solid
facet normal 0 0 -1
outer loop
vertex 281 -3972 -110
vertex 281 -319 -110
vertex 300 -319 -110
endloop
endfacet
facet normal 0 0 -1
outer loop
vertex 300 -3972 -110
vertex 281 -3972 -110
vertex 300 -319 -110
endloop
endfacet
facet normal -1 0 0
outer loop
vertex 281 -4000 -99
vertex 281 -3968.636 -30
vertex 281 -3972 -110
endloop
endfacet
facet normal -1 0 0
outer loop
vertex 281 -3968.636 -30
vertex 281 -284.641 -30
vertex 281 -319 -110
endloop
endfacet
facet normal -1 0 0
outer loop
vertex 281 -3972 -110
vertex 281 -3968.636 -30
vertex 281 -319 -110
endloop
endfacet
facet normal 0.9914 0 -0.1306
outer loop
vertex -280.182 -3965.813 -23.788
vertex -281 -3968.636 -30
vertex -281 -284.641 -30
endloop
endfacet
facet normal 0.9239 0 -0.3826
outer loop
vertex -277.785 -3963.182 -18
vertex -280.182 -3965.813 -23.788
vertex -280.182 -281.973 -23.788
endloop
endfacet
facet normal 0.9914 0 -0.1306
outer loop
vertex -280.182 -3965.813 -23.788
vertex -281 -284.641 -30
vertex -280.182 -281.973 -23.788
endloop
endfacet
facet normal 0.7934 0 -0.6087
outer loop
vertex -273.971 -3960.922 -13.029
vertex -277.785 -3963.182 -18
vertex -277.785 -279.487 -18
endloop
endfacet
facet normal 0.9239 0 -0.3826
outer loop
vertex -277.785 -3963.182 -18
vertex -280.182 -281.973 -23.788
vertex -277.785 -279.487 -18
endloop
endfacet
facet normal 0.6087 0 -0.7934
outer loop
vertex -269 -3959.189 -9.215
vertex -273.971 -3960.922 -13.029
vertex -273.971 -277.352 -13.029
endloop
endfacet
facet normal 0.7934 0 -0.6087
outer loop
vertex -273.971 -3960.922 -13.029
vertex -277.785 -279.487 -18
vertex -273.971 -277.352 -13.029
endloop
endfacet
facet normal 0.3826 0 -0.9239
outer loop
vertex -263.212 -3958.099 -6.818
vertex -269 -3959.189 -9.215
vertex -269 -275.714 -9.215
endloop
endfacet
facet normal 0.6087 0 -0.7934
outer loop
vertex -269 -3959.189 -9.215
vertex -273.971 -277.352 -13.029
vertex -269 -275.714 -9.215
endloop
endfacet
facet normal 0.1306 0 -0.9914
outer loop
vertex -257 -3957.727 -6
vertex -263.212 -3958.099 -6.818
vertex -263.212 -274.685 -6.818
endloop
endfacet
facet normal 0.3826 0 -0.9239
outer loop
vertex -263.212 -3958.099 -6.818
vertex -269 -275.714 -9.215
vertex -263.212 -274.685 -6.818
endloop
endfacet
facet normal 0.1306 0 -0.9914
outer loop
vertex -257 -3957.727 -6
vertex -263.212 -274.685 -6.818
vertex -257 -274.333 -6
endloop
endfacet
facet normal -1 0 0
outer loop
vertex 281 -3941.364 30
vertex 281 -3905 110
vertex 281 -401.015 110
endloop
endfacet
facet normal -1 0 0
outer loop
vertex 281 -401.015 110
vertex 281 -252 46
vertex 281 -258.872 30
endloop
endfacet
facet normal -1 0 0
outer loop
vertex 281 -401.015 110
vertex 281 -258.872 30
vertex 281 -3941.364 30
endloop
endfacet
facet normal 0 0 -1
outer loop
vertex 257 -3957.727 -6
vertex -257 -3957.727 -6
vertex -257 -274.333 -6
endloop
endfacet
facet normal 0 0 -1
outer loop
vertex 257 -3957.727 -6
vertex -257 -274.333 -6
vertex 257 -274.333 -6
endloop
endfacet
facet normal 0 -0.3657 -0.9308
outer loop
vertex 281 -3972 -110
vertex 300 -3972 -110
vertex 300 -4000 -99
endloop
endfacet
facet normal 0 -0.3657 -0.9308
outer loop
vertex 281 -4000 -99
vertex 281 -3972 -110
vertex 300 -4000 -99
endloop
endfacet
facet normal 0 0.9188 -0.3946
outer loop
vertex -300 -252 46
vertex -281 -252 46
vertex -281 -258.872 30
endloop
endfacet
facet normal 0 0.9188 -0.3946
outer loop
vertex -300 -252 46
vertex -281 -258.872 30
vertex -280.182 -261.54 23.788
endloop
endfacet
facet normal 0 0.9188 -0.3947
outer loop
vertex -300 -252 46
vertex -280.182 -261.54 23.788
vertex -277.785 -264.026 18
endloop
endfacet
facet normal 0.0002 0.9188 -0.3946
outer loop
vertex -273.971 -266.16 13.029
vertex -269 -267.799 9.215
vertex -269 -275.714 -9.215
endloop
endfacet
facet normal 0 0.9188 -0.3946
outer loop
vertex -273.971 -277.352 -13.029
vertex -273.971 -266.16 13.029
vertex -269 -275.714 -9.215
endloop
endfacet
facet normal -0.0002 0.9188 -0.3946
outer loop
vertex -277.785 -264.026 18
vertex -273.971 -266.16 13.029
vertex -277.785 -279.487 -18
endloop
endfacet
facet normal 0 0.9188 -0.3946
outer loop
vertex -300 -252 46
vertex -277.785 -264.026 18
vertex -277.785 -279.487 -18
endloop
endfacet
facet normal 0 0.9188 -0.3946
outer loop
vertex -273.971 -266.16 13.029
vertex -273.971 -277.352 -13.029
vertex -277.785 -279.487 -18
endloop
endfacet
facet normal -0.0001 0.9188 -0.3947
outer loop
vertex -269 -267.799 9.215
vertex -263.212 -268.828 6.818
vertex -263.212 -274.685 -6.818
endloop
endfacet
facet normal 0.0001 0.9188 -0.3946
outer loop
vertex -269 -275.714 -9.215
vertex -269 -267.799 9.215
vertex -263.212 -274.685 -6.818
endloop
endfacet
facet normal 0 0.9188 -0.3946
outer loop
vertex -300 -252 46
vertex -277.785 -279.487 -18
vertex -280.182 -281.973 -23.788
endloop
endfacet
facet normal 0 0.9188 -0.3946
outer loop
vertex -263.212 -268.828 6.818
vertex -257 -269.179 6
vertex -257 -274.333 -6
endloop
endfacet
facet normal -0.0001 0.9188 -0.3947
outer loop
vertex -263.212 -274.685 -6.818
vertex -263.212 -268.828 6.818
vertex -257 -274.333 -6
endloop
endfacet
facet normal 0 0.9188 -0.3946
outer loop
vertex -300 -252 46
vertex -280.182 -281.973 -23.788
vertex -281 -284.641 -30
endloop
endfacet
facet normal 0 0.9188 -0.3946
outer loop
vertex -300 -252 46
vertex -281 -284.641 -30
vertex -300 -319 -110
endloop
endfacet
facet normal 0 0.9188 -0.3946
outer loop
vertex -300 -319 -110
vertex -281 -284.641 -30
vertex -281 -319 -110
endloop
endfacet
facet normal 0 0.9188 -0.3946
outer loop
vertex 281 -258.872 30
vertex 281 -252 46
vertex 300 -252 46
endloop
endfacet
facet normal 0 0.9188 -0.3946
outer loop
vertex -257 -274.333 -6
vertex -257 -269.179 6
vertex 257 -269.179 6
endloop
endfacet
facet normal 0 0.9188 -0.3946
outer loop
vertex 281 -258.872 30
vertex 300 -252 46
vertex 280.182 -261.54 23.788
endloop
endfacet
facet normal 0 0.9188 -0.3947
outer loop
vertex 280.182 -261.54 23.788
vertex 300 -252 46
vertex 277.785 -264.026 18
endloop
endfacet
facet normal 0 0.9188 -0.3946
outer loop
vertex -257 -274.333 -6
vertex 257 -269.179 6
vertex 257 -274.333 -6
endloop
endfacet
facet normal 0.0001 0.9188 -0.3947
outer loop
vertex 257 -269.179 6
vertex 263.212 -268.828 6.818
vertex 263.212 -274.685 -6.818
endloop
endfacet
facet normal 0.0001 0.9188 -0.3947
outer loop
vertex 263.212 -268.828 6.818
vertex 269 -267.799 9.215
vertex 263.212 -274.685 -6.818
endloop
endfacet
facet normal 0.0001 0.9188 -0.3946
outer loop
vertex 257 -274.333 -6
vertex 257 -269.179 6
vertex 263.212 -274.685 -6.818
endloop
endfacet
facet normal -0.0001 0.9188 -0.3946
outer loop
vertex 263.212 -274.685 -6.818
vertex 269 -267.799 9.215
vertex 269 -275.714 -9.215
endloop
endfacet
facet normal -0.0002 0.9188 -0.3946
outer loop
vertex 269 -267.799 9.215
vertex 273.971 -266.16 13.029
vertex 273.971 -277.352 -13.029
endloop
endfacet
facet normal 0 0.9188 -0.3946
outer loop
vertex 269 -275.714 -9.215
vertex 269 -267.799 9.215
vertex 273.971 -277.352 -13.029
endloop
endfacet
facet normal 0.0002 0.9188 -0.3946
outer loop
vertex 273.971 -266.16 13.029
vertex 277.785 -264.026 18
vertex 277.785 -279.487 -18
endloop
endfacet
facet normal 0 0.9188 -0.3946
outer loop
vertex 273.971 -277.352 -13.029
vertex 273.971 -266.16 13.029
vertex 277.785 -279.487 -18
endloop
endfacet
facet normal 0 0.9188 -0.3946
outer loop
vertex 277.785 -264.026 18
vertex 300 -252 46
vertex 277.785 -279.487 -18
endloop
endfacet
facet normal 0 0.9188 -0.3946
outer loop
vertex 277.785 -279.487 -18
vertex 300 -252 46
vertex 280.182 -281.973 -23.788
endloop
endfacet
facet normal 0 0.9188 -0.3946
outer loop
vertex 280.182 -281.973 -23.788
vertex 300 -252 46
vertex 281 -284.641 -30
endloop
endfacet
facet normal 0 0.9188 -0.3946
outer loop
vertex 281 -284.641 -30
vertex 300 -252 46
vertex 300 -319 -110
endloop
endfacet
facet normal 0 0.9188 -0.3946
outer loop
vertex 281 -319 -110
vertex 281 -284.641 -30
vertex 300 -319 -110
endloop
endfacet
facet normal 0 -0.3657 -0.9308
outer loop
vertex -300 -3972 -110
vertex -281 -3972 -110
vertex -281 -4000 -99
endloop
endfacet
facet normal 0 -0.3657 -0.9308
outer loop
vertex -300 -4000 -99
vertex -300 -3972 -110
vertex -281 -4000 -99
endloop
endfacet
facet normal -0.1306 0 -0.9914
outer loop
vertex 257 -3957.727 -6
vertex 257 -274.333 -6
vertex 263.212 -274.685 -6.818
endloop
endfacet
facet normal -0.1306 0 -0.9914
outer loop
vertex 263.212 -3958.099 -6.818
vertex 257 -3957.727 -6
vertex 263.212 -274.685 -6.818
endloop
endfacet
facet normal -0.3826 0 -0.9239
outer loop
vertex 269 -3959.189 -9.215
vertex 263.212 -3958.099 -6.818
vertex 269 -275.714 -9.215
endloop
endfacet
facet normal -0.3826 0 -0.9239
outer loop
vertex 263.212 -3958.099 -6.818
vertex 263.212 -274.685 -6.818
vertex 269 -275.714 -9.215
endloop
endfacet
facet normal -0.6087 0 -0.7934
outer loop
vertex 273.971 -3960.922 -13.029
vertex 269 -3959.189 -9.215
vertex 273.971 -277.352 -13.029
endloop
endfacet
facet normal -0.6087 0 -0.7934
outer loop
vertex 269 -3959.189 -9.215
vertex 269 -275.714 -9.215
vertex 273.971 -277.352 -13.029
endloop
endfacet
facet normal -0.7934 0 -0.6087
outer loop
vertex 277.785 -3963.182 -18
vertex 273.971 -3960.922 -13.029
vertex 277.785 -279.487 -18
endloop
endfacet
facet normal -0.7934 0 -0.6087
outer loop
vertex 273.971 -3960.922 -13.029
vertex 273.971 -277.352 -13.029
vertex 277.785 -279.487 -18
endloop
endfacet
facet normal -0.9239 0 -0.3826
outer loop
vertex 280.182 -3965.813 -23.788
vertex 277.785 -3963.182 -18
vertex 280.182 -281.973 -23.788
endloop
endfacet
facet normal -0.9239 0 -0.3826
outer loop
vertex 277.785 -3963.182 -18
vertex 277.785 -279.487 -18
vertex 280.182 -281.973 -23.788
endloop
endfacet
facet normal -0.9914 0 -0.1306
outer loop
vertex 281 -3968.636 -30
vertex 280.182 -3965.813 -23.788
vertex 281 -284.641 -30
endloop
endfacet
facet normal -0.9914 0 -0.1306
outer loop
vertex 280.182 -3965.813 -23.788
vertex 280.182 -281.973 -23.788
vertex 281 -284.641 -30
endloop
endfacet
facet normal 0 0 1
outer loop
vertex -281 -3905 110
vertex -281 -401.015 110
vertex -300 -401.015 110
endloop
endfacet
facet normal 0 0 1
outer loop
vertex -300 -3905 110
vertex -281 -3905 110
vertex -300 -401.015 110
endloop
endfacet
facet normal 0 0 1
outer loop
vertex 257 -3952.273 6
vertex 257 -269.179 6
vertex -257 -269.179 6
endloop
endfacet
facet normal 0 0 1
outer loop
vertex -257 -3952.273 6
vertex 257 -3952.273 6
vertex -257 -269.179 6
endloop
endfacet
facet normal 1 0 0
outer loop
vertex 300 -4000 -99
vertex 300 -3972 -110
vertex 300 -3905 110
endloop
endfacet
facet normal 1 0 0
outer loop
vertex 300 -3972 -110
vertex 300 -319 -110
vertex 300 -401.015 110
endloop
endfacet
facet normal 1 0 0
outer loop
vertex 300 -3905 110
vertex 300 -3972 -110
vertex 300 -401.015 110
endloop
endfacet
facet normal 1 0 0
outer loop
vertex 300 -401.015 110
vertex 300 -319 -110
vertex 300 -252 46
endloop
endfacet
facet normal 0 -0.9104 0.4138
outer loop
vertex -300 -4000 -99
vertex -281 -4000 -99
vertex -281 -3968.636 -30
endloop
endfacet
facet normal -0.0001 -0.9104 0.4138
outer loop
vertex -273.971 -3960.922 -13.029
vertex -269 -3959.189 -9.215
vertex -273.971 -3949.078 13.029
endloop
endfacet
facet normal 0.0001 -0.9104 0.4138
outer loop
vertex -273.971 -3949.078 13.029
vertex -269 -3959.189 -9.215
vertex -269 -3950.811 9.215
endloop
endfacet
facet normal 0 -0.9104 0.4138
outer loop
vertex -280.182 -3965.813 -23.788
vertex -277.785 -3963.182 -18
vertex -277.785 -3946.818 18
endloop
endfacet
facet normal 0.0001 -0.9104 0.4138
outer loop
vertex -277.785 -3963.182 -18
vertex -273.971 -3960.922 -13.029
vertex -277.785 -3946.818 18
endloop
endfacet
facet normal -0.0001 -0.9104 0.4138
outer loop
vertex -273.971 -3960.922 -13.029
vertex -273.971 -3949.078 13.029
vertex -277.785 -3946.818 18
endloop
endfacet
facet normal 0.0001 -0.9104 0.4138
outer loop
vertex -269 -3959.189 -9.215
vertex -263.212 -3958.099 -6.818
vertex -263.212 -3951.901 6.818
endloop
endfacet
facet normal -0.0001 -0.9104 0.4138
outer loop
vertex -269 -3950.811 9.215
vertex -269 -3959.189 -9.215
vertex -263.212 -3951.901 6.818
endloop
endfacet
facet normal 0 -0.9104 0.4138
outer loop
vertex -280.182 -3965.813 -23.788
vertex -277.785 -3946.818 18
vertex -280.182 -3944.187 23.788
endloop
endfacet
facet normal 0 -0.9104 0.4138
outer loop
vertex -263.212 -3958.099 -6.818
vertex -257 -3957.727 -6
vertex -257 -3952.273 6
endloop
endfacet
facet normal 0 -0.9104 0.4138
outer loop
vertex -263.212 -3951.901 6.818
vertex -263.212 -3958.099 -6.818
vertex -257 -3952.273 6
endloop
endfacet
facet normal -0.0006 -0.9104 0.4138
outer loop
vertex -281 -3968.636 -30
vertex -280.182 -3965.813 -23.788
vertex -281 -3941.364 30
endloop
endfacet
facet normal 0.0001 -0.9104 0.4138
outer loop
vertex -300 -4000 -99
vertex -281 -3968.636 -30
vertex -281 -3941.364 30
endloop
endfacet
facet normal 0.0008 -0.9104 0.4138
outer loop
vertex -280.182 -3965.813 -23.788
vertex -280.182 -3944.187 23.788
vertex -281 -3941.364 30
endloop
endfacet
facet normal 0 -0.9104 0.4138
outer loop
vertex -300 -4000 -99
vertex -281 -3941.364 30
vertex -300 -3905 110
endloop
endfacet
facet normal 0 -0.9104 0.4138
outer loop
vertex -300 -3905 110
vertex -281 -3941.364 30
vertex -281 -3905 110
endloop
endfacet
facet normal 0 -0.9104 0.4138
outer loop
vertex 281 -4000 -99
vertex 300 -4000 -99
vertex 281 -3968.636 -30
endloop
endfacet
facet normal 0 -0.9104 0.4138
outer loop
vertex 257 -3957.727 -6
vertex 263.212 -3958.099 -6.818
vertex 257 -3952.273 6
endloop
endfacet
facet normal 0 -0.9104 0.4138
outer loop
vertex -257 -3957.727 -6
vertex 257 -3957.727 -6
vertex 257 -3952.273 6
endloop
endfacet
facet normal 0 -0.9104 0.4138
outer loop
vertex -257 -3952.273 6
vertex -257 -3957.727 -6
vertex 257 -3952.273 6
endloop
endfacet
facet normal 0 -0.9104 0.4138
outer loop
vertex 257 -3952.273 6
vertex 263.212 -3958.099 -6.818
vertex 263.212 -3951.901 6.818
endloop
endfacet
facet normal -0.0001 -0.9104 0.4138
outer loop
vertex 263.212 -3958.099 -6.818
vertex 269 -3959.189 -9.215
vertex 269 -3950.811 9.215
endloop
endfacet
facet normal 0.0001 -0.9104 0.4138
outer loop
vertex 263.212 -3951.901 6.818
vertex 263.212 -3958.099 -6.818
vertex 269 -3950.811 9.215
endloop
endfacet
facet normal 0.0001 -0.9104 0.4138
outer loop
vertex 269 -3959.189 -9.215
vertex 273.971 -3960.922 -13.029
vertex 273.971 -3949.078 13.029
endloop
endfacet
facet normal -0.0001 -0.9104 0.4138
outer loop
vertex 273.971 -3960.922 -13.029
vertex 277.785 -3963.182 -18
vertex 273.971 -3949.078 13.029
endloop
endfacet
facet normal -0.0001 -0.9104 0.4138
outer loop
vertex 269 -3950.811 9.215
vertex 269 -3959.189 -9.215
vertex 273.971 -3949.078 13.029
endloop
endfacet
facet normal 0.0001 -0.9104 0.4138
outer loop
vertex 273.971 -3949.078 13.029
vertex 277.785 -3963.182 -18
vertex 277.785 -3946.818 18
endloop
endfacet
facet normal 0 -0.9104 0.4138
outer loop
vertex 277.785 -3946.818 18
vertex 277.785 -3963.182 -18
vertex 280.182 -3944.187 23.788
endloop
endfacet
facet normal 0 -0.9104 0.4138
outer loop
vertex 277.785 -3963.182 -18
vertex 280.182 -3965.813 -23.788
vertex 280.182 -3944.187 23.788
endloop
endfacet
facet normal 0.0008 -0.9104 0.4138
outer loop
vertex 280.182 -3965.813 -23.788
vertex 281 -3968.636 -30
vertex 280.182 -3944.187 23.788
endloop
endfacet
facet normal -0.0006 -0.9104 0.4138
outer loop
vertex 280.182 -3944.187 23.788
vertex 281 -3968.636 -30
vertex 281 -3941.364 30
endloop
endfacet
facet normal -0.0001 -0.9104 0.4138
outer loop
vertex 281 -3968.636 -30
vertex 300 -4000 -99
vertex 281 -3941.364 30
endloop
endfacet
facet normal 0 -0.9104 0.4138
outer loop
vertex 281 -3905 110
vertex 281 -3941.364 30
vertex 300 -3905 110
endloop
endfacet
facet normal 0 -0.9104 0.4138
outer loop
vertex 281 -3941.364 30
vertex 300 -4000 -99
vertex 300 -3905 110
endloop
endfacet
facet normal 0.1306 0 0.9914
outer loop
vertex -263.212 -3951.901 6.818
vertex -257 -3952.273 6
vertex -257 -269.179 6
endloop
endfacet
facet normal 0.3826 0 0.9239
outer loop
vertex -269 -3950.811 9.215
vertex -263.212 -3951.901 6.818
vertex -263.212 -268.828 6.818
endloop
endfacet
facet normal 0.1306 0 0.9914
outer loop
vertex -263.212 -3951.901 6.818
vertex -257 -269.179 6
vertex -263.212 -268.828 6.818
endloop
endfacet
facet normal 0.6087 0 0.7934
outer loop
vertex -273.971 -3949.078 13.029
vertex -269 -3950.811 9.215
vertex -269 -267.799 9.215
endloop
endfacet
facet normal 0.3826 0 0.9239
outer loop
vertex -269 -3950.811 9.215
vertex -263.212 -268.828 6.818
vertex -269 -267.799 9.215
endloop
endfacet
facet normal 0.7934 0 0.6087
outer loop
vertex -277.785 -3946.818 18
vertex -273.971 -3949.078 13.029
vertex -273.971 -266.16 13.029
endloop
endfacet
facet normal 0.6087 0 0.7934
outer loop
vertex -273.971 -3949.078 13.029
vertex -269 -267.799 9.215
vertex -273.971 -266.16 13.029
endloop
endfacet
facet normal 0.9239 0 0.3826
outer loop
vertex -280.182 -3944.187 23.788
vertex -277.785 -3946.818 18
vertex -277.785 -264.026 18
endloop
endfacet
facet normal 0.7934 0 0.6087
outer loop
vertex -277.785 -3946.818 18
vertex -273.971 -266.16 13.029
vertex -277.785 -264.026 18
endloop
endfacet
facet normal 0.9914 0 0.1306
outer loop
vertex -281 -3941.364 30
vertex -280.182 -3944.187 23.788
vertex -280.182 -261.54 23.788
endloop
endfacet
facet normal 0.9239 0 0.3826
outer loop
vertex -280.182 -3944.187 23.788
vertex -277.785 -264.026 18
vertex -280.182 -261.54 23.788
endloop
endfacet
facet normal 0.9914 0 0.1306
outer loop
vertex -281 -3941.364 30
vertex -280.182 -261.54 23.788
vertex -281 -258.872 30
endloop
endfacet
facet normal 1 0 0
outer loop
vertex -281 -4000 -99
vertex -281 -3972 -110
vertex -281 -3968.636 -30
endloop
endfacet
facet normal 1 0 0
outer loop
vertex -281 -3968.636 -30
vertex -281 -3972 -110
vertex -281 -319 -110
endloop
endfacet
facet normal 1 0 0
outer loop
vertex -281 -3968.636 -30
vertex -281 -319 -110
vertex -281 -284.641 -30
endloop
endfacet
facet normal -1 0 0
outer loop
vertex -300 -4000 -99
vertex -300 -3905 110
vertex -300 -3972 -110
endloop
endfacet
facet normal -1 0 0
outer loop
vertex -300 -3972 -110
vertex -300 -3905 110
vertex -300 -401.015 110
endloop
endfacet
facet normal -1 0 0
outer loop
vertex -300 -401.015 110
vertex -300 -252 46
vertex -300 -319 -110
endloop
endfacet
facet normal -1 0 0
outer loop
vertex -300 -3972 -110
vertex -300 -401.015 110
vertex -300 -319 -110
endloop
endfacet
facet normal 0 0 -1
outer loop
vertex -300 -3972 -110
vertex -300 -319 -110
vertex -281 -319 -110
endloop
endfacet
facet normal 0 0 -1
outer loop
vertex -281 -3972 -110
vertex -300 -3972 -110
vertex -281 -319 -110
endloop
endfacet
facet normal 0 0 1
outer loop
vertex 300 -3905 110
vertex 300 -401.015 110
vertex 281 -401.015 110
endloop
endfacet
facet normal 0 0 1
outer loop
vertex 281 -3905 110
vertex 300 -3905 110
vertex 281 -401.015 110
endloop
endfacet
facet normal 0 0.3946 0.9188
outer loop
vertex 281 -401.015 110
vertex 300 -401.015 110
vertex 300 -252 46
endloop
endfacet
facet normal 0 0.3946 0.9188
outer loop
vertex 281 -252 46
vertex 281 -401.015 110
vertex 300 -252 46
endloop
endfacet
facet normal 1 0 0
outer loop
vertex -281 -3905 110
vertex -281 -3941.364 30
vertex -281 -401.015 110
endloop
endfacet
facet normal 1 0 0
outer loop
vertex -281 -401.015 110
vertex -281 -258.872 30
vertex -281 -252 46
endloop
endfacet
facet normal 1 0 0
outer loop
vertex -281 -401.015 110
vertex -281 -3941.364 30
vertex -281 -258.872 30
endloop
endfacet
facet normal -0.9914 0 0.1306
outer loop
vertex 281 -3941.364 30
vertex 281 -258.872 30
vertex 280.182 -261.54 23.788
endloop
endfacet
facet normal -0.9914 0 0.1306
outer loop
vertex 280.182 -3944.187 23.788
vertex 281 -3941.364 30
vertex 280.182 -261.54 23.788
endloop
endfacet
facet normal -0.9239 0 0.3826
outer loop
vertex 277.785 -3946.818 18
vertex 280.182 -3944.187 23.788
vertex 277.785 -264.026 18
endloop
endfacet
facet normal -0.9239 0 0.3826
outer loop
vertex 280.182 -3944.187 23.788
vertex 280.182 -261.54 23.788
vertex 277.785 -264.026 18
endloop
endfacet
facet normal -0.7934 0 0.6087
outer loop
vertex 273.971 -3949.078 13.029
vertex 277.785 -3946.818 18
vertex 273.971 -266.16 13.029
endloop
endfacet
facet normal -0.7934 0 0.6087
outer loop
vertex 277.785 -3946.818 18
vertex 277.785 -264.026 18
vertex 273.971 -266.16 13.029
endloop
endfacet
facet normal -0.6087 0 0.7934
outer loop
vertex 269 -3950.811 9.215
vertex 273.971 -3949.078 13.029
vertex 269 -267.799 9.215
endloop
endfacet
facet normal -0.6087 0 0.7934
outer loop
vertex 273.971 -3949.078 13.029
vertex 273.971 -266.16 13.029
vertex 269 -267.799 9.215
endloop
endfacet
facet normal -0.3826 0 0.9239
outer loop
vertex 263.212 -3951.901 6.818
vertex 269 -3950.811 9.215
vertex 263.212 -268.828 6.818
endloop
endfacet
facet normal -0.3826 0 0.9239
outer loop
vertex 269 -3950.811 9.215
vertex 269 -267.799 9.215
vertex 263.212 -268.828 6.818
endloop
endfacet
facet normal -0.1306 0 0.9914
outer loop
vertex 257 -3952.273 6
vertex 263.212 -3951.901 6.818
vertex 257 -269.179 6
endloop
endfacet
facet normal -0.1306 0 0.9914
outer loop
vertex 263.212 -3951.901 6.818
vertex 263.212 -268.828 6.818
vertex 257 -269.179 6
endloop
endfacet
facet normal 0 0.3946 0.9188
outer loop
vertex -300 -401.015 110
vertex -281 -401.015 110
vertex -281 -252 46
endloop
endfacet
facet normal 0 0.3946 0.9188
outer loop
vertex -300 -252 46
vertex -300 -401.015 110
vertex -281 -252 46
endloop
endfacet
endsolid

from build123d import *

# Parameters (mm, degrees)
F1_DEPTH = 4000
F3_DEPTH = 600.001


with BuildPart() as f1:
    # F0 (on Front) → F1 (new body)
    with BuildSketch(Plane.XZ):
        with BuildLine():
            Line((257, 6), (0, 6))
            Line((0, 6), (-257, 6))
            ThreePointArc((-257, 6), (-273.970563, 13.029437), (-281, 30))
            Line((-281, 30), (-281, 110))
            Line((-281, 110), (-300, 110))
            Line((-300, 110), (-300, 0))
            Line((-300, 0), (-300, -110))
            Line((-300, -110), (-281, -110))
            Line((-281, -110), (-281, -30))
            ThreePointArc((-281, -30), (-273.970563, -13.029437), (-257, -6))
            Line((-257, -6), (0, -6))
            Line((0, -6), (257, -6))
            ThreePointArc((257, -6), (273.970563, -13.029437), (281, -30))
            Line((281, -30), (281, -110))
            Line((281, -110), (300, -110))
            Line((300, -110), (300, 0))
            Line((300, 0), (300, 110))
            Line((300, 110), (281, 110))
            Line((281, 110), (281, 30))
            ThreePointArc((281, 30), (273.970563, 13.029437), (257, 6))
        make_face()
    extrude(amount=F1_DEPTH)

    # F2 (on face) → F3 (cut, through all)
    with BuildSketch(Plane.YZ.offset(300)):
        Polygon((-4000, -110), (-3972, -110), (-4000, -99), align=None)
        Polygon((-4000, 110), (-4000, -99), (-3905, 110), align=None)
        Polygon((-252, 46), (-319, -110), (0, -110), (0, 110), (-401.014925, 110), align=None)
    extrude(amount=-F3_DEPTH, mode=Mode.SUBTRACT)


solid = f1.part
